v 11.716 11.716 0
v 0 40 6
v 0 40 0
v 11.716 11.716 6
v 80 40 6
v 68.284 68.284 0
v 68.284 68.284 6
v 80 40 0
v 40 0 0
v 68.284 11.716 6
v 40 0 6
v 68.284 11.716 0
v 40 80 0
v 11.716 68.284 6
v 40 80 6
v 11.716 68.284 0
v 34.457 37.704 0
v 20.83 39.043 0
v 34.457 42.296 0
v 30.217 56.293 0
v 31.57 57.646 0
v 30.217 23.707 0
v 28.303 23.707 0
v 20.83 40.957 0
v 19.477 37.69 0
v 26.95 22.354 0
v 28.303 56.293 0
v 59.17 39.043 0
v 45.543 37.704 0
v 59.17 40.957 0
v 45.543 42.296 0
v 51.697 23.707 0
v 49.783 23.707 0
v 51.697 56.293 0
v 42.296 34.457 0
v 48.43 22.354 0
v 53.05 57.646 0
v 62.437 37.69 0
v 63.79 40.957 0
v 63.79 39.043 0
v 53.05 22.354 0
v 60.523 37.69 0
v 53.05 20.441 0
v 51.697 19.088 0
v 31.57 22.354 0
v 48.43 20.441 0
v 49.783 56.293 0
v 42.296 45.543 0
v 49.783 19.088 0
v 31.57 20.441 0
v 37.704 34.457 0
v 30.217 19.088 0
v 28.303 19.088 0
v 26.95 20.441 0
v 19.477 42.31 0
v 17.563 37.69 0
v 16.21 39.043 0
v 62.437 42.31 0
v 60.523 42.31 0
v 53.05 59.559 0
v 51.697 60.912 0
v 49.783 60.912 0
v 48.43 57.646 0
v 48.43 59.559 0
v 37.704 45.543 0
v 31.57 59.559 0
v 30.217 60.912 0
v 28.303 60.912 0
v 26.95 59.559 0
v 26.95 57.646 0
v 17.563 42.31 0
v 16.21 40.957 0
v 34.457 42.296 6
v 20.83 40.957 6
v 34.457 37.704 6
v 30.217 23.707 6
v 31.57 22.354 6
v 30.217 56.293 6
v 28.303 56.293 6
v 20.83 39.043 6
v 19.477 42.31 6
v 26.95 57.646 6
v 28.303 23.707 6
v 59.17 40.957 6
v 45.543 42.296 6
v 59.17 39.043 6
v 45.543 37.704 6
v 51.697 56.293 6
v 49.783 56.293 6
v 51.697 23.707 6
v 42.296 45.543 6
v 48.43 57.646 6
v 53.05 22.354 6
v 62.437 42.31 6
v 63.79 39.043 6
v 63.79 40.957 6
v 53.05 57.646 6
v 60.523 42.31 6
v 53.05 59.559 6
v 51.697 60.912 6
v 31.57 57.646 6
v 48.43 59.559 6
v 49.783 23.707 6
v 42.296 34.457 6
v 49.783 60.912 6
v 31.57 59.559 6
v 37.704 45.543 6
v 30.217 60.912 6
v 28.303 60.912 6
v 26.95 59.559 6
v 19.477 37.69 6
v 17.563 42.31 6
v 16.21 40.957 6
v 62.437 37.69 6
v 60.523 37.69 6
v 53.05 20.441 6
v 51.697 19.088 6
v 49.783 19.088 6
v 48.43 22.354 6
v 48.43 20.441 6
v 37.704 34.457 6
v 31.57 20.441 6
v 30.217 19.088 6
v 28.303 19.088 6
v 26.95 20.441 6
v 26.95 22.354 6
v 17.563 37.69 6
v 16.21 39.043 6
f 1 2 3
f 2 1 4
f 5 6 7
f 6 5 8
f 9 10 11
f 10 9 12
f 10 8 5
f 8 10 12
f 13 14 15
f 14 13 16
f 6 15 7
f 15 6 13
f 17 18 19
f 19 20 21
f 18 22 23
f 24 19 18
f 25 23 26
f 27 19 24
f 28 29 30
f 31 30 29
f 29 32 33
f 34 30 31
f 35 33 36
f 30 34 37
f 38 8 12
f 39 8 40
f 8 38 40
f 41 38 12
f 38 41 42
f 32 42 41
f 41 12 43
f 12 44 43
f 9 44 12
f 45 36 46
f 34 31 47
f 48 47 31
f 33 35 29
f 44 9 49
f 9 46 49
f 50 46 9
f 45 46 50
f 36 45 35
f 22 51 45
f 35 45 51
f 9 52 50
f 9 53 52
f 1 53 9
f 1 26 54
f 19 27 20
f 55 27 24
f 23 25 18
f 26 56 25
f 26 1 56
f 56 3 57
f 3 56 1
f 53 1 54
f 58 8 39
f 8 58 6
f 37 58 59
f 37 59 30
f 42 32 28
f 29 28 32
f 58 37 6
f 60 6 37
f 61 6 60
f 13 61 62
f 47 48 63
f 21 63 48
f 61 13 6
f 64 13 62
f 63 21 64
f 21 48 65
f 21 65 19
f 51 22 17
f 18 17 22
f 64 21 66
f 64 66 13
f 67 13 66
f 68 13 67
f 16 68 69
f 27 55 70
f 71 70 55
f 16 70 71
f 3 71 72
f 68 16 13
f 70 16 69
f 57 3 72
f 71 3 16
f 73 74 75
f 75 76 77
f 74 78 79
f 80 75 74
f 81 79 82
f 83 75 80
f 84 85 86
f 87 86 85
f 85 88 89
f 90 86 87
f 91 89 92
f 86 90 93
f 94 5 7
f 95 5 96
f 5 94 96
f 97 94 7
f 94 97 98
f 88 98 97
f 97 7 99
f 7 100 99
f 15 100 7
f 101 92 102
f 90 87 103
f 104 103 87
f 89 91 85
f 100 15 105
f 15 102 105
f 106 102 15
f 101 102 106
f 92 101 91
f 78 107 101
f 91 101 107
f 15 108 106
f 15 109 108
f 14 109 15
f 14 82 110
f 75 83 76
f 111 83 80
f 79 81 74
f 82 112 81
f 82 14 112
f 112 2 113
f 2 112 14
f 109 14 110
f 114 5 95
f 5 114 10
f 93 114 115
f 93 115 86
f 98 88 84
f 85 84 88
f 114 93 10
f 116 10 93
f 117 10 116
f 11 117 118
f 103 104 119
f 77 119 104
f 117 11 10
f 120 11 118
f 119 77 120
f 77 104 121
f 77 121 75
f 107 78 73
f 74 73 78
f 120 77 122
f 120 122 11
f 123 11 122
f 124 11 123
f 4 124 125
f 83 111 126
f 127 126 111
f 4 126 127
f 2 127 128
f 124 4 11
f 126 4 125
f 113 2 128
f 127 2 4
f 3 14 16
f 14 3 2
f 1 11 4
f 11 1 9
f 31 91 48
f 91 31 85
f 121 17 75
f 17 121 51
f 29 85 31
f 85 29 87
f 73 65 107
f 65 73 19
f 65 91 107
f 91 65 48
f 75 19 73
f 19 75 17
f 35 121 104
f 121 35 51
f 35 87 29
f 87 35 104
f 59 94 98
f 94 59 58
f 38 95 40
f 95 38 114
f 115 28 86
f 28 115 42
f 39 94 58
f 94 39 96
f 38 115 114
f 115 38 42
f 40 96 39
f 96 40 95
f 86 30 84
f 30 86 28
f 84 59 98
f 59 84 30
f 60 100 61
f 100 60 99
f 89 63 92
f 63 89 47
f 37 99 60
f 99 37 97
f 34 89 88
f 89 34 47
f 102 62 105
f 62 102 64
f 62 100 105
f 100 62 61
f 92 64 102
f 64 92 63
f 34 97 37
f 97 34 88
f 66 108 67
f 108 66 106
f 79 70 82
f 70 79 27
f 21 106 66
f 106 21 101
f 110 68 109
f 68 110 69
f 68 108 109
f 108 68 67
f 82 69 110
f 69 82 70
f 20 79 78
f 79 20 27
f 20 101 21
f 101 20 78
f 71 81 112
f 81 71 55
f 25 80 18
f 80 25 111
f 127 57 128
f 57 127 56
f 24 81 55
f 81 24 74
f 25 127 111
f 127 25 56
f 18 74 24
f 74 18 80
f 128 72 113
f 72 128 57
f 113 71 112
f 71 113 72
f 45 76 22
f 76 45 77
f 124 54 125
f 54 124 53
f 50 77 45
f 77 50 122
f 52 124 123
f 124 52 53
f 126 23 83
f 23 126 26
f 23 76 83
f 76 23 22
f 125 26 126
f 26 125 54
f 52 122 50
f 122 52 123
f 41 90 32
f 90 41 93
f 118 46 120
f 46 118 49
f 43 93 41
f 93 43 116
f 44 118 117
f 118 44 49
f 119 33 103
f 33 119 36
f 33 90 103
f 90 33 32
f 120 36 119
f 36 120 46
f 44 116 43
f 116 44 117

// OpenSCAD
$fn = 32;

// ----------------------------------------------------------------------
// Polygon plate: 8-gon R40, 6 bolt windows
// ----------------------------------------------------------------------

// --- parameters (mm) ---
sides = 8;                // number of polygon sides
plate_r = 40;             // circumscribed radius of the polygon
bore_r = 6;               // centre bore radius
bolts = 6;                // number of bolt windows
ring_r = 21.48;           // bolt-circle radius
bolt_r = 2.5;             // bolt window radius
plate_t = 6;              // plate thickness, Z (extrusion height)

plate_d = 2 * plate_r;  // circumscribed diameter
bore_d = 2 * bore_r;  // centre bore diameter
bolt_d = 2 * bolt_r;  // bolt window diameter
ring_d = 2 * ring_r;  // bolt-circle diameter

profile = [[80, 40], [68.284, 68.284], [40, 80], [11.716, 68.284], [0, 40], [11.716, 11.716], [40, 0], [68.284, 11.716]];  // primary outline, 8 points, counter clockwise
void_1 = [[45.543, 42.296], [42.296, 45.543], [37.704, 45.543], [34.457, 42.296], [34.457, 37.704], [37.704, 34.457], [42.296, 34.457], [45.543, 37.704]];  // centre bore, 8 points
void_2 = [[63.79, 40.957], [62.437, 42.31], [60.523, 42.31], [59.17, 40.957], [59.17, 39.043], [60.523, 37.69], [62.437, 37.69], [63.79, 39.043]];  // bolt window 1, 8 points
void_3 = [[53.05, 59.559], [51.697, 60.912], [49.783, 60.912], [48.43, 59.559], [48.43, 57.646], [49.783, 56.293], [51.697, 56.293], [53.05, 57.646]];  // bolt window 2, 8 points
void_4 = [[31.57, 59.559], [30.217, 60.912], [28.303, 60.912], [26.95, 59.559], [26.95, 57.646], [28.303, 56.293], [30.217, 56.293], [31.57, 57.646]];  // bolt window 3, 8 points
void_5 = [[20.83, 40.957], [19.477, 42.31], [17.563, 42.31], [16.21, 40.957], [16.21, 39.043], [17.563, 37.69], [19.477, 37.69], [20.83, 39.043]];  // bolt window 4, 8 points
void_6 = [[31.57, 22.354], [30.217, 23.707], [28.303, 23.707], [26.95, 22.354], [26.95, 20.441], [28.303, 19.088], [30.217, 19.088], [31.57, 20.441]];  // bolt window 5, 8 points
void_7 = [[53.05, 22.354], [51.697, 23.707], [49.783, 23.707], [48.43, 22.354], [48.43, 20.441], [49.783, 19.088], [51.697, 19.088], [53.05, 20.441]];  // bolt window 6, 8 points

// --- the one profile operation ---
difference() {
  linear_extrude(height = plate_t) polygon(points = profile);
  translate([0, 0, -1])
    linear_extrude(height = plate_t + 2) polygon(points = void_1);
  translate([0, 0, -1])
    linear_extrude(height = plate_t + 2) polygon(points = void_2);
  translate([0, 0, -1])
    linear_extrude(height = plate_t + 2) polygon(points = void_3);
  translate([0, 0, -1])
    linear_extrude(height = plate_t + 2) polygon(points = void_4);
  translate([0, 0, -1])
    linear_extrude(height = plate_t + 2) polygon(points = void_5);
  translate([0, 0, -1])
    linear_extrude(height = plate_t + 2) polygon(points = void_6);
  translate([0, 0, -1])
    linear_extrude(height = plate_t + 2) polygon(points = void_7);
}
